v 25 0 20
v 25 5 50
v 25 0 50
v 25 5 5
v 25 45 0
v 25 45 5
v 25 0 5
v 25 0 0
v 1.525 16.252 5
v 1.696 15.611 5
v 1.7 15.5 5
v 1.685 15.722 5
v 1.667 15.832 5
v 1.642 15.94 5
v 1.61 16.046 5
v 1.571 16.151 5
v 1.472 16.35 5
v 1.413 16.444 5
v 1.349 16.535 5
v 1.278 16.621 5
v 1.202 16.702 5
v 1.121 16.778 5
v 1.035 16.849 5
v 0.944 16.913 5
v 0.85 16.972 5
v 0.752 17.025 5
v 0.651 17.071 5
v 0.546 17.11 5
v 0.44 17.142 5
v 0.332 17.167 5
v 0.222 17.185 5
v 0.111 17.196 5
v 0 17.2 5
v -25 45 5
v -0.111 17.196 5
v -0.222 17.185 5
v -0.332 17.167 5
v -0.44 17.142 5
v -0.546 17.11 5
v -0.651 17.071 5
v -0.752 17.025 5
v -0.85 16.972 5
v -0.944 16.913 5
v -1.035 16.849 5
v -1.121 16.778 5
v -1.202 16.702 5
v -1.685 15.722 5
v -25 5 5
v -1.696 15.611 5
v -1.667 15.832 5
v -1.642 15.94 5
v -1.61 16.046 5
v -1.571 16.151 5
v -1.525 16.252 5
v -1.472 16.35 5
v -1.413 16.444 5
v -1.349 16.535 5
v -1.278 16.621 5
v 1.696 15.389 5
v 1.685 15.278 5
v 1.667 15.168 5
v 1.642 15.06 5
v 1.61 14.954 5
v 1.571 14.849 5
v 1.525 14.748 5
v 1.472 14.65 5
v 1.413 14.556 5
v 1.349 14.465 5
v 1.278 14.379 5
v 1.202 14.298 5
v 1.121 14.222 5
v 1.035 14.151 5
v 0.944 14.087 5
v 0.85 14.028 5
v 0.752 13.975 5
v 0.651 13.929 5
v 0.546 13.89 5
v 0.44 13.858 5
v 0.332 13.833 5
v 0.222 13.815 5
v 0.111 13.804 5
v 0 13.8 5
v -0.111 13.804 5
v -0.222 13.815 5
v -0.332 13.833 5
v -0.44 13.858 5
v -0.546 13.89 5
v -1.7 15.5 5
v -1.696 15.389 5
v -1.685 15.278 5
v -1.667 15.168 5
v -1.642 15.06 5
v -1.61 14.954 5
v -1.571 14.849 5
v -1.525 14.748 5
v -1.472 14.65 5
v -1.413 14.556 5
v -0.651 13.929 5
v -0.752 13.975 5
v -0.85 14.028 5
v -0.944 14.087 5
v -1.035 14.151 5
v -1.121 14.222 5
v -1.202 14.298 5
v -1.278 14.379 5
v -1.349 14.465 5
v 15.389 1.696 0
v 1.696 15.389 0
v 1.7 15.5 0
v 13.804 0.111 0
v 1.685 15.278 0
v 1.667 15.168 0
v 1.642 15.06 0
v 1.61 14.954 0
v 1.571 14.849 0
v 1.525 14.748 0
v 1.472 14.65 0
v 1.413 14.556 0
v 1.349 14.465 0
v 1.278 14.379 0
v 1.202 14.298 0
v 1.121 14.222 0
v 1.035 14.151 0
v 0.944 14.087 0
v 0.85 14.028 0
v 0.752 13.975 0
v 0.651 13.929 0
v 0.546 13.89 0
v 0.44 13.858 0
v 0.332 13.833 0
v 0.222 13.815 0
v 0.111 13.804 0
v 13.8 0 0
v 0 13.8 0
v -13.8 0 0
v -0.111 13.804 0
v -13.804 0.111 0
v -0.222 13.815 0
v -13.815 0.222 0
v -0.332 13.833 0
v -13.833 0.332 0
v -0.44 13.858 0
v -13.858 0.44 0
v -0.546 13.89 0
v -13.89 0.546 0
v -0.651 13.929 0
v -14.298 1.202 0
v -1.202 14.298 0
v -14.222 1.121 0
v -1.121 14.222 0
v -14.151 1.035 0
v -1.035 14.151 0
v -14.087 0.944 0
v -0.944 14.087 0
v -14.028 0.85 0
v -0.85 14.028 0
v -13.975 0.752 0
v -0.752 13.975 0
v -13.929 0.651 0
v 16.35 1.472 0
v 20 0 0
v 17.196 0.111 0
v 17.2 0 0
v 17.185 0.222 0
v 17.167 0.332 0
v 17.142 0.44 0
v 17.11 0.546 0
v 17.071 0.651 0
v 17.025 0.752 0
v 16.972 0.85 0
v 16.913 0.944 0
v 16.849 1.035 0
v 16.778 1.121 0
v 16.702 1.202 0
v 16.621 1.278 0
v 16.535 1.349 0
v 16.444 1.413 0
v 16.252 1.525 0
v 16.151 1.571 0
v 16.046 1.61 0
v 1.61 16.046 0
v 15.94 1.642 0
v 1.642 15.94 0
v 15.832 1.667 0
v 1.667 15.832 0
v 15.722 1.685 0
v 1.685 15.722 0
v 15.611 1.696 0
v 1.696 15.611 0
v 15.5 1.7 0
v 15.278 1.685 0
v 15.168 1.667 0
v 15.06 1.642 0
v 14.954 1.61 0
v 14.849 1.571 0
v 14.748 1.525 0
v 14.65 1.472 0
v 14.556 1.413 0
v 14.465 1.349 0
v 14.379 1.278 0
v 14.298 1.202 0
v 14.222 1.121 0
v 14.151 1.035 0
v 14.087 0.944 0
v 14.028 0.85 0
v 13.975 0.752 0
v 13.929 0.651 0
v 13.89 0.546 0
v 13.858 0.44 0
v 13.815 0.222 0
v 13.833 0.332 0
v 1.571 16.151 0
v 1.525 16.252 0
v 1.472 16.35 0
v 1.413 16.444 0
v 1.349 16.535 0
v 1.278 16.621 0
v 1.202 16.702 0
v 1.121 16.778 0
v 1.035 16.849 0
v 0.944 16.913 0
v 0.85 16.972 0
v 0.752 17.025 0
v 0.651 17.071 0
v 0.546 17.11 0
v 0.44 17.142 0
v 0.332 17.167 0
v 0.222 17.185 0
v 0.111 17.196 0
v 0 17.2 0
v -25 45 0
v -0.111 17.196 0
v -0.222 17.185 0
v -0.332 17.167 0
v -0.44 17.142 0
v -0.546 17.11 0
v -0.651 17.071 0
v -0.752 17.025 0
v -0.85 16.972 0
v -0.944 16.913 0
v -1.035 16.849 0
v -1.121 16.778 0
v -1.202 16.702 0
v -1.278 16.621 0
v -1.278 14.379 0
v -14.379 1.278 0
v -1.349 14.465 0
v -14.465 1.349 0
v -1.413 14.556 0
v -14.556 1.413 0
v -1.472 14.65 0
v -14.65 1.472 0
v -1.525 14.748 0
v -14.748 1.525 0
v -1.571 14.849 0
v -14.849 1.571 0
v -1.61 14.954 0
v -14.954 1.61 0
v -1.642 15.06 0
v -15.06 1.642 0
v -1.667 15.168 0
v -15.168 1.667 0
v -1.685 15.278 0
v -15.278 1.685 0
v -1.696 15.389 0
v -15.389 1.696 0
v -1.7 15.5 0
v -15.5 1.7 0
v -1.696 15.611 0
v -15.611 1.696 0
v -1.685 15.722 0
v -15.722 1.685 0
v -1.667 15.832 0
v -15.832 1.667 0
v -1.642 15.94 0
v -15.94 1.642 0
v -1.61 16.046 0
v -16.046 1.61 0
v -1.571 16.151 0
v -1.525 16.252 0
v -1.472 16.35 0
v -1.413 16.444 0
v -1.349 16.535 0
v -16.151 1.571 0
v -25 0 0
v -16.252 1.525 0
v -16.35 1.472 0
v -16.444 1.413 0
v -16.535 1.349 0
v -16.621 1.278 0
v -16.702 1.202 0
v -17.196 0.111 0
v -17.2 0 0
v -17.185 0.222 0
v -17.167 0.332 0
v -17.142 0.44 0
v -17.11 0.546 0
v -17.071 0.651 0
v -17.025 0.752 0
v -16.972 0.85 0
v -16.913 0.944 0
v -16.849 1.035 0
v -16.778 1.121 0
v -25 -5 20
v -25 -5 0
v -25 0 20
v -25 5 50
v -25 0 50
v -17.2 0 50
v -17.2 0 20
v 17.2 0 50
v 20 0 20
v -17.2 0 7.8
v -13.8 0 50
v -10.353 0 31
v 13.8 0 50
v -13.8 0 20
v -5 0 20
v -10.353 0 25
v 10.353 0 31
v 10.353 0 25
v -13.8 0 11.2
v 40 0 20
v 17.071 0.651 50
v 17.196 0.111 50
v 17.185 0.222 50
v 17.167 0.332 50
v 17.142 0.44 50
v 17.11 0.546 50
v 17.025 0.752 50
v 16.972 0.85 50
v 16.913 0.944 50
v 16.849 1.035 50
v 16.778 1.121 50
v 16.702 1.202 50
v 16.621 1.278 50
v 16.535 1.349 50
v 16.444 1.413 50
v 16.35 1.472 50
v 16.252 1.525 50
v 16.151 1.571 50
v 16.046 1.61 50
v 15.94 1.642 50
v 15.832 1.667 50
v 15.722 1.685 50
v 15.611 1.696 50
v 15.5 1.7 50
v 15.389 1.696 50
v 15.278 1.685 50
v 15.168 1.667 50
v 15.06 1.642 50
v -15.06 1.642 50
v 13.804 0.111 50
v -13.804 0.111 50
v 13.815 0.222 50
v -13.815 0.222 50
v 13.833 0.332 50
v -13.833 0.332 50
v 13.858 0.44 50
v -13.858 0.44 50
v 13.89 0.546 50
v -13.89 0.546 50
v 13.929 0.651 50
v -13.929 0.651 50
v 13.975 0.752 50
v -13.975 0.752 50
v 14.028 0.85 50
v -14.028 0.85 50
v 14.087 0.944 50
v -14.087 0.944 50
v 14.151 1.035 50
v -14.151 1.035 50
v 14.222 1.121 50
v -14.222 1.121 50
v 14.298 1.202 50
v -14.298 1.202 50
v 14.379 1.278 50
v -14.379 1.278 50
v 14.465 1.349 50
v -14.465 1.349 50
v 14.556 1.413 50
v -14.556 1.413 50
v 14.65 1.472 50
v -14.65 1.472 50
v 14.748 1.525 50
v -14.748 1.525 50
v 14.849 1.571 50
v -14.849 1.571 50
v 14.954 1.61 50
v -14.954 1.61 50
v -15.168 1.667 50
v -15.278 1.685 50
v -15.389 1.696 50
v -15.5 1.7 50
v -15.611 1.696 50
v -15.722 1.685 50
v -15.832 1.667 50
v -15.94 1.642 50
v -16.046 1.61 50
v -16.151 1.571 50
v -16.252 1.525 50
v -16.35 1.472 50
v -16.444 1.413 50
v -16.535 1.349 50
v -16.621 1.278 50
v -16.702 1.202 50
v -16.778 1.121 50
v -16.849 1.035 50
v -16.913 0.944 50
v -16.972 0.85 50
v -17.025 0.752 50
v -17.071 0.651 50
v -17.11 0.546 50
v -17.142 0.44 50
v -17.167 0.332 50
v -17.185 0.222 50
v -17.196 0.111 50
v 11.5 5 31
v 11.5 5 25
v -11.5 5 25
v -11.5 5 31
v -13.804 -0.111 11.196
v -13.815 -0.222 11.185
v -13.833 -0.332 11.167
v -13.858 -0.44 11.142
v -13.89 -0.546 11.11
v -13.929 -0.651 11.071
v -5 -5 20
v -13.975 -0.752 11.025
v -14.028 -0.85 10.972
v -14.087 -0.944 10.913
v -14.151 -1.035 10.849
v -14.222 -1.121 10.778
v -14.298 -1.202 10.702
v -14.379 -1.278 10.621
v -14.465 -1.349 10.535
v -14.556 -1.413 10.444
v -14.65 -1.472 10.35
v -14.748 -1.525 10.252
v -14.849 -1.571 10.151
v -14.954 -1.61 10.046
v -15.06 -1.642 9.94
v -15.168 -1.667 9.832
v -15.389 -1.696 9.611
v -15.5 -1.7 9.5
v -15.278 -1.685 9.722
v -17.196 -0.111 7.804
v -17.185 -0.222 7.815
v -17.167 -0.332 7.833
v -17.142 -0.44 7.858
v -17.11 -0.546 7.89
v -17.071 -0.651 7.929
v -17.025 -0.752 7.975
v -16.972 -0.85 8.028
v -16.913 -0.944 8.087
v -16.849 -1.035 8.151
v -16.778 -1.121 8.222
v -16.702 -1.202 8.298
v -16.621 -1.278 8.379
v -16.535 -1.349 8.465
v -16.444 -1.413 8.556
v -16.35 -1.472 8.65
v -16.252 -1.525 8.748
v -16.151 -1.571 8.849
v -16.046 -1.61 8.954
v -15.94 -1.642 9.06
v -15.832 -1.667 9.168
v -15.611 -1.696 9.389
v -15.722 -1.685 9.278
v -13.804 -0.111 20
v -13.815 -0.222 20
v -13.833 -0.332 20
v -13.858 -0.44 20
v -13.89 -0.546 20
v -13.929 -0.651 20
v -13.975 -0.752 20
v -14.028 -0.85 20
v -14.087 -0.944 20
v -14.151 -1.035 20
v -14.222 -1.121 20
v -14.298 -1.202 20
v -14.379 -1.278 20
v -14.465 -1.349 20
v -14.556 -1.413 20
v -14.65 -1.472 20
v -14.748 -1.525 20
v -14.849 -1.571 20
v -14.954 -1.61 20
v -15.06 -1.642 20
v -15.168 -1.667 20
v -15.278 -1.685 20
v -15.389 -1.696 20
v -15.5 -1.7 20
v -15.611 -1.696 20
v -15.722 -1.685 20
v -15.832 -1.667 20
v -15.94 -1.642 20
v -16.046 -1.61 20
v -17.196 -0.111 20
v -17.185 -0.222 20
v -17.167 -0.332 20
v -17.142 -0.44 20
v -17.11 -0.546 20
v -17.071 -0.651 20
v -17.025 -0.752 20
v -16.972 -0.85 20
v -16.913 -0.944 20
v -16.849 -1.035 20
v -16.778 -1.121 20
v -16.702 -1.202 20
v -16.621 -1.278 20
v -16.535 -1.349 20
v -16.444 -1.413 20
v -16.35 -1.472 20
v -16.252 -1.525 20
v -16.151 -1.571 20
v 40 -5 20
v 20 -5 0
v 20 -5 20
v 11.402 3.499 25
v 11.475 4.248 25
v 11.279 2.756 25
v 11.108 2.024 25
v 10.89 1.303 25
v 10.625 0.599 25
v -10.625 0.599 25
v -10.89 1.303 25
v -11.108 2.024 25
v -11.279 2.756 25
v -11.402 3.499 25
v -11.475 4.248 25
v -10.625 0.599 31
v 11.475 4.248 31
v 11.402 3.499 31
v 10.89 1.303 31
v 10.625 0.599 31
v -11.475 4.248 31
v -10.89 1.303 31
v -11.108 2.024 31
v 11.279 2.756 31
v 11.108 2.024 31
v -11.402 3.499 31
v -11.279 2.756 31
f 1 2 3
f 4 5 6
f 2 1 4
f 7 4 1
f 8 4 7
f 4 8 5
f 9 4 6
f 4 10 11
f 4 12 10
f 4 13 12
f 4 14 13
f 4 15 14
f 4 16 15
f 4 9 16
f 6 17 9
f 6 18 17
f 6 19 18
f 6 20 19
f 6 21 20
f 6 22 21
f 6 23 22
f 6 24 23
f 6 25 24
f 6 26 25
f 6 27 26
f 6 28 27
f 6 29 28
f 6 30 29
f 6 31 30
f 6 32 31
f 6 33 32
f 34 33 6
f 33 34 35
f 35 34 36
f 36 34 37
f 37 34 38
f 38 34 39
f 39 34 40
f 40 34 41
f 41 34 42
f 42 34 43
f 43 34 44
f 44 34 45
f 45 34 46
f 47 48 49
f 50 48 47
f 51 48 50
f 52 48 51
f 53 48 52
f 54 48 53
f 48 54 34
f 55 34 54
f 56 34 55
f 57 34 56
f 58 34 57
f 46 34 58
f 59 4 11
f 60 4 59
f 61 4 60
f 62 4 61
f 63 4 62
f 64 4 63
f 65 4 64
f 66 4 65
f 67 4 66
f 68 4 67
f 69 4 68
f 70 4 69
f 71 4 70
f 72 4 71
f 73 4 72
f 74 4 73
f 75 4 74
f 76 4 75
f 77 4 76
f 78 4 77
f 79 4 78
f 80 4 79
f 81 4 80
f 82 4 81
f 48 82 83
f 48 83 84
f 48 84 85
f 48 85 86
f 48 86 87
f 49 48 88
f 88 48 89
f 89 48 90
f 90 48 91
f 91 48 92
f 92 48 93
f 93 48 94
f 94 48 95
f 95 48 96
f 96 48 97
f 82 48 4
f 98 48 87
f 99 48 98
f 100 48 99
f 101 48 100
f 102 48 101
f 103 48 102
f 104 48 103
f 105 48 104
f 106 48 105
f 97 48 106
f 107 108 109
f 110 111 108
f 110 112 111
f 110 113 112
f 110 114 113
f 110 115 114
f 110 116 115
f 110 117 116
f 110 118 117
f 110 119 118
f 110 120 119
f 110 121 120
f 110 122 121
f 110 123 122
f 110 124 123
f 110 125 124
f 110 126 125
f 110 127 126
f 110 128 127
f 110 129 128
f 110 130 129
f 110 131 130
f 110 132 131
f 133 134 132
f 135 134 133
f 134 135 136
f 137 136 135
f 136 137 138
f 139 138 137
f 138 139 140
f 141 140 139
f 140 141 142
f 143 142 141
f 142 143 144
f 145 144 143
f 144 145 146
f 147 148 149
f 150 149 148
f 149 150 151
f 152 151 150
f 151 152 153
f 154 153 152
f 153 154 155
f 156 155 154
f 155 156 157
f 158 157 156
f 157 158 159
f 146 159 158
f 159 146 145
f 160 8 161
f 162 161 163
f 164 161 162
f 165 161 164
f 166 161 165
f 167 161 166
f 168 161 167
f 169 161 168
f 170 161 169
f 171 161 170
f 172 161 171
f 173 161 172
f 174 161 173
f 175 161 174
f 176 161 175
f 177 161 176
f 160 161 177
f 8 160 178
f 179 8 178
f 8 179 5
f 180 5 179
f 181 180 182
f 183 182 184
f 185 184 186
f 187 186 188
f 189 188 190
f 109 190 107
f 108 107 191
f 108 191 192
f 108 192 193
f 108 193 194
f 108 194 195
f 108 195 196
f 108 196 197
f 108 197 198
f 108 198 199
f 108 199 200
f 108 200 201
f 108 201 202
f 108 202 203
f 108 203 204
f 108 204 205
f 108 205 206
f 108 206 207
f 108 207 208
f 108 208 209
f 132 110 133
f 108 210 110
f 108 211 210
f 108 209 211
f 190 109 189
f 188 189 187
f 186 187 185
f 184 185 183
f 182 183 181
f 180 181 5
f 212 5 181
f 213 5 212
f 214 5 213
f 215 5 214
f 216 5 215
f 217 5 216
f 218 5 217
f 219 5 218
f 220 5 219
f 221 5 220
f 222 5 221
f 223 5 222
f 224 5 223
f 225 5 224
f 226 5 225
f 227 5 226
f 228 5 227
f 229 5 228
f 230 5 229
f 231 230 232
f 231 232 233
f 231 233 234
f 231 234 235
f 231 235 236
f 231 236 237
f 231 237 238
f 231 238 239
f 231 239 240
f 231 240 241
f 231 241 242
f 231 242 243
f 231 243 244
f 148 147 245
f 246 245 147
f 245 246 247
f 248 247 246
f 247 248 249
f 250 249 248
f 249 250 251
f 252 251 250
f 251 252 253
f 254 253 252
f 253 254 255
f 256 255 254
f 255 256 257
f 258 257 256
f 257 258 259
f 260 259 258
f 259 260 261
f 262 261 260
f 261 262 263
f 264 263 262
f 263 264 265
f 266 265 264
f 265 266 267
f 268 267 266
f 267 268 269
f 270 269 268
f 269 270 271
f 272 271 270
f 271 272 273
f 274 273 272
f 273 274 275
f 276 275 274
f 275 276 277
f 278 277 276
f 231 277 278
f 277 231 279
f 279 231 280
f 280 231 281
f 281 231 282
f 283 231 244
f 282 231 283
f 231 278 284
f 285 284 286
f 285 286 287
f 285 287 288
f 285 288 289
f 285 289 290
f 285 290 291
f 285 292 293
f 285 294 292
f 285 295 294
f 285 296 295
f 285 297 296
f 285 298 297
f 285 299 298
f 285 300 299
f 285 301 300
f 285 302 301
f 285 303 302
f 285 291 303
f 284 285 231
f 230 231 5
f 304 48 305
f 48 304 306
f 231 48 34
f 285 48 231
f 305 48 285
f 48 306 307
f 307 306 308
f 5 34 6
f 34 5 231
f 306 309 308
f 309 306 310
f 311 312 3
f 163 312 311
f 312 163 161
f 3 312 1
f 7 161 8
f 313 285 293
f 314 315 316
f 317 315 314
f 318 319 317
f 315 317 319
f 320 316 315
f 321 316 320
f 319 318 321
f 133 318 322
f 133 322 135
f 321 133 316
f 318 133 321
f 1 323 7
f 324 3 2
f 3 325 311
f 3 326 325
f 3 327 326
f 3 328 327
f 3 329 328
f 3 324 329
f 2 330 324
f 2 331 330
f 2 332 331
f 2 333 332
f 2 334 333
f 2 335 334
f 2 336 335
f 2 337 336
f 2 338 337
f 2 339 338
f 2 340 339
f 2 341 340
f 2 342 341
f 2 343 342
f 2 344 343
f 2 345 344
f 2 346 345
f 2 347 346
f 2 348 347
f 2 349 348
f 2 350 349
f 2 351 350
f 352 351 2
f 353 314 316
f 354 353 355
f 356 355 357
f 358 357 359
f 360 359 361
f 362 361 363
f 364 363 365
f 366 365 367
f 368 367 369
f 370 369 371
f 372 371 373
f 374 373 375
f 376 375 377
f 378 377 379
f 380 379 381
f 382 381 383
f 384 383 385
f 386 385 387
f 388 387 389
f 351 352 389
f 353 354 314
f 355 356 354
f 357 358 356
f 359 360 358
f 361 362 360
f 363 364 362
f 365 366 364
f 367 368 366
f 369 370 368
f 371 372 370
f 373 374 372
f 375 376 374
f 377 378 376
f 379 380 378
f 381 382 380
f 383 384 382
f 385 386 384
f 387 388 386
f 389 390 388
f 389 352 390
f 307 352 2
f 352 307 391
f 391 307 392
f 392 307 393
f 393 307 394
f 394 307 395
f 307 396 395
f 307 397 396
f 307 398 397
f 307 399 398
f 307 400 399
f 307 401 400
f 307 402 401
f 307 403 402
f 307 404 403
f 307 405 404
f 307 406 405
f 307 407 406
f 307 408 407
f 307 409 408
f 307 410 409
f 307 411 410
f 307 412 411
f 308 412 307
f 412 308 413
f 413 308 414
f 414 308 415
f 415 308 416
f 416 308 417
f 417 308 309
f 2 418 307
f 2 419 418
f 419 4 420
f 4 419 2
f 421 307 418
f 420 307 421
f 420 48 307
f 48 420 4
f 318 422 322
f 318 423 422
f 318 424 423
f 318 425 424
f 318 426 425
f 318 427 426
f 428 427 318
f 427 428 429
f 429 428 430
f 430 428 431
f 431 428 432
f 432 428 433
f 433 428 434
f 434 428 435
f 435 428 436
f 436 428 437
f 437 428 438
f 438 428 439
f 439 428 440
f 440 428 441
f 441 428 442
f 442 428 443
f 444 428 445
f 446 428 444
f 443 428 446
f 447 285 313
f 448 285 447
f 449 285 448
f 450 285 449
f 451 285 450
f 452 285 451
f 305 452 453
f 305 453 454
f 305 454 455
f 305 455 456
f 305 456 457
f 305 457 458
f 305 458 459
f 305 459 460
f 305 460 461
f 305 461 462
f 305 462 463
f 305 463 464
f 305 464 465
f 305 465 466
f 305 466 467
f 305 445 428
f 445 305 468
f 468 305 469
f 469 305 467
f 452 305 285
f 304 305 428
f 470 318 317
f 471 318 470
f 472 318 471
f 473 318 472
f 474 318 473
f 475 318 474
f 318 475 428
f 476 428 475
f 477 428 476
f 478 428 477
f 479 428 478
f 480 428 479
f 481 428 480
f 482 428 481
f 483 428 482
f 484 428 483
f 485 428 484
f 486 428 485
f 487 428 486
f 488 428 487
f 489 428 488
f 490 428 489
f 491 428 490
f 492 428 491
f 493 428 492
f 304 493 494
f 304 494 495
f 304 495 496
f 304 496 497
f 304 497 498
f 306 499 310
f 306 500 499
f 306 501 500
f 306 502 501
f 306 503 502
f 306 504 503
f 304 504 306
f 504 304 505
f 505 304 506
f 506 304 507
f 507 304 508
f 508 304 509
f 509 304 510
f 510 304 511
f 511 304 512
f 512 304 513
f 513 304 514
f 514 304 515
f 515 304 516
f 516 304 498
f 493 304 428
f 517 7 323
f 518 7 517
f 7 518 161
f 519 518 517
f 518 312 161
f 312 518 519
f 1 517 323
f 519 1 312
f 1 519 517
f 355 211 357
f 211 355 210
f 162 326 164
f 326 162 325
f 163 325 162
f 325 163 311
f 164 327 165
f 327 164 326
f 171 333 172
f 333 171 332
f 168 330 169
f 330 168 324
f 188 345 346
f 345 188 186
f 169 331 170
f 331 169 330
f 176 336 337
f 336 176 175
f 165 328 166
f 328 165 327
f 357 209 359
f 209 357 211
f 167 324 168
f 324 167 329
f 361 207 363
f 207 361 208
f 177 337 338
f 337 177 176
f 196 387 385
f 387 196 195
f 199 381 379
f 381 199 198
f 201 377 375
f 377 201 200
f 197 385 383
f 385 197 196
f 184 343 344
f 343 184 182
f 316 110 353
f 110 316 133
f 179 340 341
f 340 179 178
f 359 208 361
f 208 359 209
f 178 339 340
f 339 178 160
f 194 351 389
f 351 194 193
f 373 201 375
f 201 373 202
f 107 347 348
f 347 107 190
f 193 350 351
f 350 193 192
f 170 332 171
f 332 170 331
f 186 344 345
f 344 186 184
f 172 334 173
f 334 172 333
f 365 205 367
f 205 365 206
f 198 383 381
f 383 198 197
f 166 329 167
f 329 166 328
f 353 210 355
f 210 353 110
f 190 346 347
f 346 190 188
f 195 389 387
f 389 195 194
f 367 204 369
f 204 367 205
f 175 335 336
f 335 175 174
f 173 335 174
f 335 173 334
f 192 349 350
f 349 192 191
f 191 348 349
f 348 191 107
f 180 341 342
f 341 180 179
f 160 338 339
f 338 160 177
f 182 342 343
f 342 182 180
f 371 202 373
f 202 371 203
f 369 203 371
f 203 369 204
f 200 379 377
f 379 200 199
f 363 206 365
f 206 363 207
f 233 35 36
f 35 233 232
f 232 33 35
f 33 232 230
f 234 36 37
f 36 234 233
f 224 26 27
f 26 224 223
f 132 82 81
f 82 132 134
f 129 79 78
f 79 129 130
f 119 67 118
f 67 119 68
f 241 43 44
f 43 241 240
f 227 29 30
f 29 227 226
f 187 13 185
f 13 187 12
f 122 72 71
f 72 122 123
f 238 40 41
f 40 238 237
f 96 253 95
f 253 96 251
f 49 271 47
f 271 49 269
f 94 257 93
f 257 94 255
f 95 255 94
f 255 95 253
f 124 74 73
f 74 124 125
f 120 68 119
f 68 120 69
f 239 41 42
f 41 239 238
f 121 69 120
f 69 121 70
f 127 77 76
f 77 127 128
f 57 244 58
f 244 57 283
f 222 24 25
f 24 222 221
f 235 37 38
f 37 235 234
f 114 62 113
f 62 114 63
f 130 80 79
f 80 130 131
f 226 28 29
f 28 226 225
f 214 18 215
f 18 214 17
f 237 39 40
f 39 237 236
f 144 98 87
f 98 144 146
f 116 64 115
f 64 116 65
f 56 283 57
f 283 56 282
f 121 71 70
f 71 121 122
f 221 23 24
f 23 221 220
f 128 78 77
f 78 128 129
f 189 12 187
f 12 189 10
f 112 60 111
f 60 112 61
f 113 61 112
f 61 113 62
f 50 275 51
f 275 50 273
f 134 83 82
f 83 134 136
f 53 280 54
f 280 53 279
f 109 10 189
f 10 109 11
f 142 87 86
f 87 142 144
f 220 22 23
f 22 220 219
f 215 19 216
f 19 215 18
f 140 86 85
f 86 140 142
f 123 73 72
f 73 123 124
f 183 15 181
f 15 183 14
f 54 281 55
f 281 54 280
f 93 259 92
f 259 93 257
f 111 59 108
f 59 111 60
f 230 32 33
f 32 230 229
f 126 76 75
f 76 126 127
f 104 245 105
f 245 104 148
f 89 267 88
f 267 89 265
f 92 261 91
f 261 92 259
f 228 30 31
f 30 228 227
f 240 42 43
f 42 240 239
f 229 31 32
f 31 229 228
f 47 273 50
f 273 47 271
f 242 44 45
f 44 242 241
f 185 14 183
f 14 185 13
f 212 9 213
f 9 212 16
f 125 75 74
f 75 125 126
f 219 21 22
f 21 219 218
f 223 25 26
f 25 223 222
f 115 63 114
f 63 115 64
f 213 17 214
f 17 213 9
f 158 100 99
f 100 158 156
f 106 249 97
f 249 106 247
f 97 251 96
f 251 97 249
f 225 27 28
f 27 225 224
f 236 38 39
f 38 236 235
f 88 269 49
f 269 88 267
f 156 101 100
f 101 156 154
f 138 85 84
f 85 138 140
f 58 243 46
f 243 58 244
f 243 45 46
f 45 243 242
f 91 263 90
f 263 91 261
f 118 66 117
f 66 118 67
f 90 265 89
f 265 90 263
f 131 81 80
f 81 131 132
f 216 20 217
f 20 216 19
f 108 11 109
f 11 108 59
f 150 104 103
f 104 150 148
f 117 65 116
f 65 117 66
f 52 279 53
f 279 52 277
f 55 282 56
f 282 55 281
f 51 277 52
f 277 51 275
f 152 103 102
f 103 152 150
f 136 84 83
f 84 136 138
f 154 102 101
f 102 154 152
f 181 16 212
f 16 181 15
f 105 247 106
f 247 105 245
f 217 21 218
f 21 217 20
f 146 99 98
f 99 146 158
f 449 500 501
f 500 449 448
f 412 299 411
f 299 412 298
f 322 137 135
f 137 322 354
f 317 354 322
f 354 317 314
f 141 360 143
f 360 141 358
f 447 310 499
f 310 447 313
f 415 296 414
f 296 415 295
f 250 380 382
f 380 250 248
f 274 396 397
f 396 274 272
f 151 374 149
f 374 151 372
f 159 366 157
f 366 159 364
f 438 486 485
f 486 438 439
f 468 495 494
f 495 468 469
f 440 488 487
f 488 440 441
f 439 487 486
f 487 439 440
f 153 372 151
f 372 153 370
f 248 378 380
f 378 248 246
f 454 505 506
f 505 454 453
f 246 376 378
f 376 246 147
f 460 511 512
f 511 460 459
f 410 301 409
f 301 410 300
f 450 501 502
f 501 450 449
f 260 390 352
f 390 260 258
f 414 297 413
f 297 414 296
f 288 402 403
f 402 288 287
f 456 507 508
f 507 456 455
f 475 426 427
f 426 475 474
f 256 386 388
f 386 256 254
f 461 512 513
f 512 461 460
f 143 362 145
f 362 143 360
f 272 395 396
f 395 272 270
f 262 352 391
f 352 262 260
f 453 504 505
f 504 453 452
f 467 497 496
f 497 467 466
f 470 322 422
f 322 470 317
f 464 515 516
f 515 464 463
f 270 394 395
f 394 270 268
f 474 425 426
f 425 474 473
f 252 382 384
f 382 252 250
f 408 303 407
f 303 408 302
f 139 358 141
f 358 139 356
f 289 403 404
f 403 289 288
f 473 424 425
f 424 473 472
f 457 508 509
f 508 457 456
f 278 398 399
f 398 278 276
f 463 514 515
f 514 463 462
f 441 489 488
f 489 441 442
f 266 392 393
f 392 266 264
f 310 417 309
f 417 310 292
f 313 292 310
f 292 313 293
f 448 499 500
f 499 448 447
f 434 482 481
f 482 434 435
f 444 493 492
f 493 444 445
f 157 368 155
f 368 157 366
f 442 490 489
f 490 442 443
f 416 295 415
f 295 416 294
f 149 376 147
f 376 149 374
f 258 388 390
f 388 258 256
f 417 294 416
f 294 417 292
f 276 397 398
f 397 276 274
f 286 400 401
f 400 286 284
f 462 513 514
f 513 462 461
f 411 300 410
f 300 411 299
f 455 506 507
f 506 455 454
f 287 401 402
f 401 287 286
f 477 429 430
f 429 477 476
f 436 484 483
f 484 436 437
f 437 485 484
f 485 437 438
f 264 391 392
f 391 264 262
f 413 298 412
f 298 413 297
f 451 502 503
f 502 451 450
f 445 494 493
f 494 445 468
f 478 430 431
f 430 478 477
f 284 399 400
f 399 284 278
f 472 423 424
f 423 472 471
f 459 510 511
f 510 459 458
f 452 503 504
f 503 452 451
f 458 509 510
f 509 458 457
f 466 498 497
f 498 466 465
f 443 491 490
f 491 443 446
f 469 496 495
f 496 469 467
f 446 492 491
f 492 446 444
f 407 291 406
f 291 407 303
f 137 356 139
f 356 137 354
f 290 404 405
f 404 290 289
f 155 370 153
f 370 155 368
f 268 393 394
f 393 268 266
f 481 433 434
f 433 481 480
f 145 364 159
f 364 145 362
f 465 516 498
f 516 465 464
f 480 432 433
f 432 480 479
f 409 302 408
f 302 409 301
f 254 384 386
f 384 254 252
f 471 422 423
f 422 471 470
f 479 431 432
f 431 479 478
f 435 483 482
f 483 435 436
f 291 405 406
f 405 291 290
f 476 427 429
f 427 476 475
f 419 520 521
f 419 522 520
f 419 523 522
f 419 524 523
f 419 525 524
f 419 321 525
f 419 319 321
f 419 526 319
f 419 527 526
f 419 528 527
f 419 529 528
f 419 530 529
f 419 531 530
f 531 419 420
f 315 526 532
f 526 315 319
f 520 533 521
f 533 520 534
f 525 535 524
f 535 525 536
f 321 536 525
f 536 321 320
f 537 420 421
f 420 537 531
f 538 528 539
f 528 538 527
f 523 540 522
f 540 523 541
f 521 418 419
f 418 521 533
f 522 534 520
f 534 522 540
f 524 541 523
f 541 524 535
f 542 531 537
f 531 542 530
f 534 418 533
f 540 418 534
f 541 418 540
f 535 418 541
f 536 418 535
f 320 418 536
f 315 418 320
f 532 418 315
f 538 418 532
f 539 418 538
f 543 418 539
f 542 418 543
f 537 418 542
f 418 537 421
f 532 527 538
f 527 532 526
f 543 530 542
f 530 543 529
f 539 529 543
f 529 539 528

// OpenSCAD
// L-shaped mounting bracket for NEMA 17 stepper motor
// Print orientation: base plate on bed (z = 0), motor plate builds upward (+Z)

// ---------- Dimensions (mm) ----------
base_x0      = -25;   // base plate x start
base_x1      = 25;    // base plate x end
base_y0      = 0;     // base plate y start
base_y1      = 45;    // base plate y end
base_z1      = 5;     // base plate thickness (z end)

motor_x0     = -25;   // motor plate x start
motor_x1     = 25;    // motor plate x end
motor_y0     = 0;     // motor plate y start
motor_y1     = 5;     // motor plate y end (thickness)
motor_z1     = 50;    // motor plate top (z end)

boss_d       = 23;    // motor centring boss hole diameter
boss_x       = 0;     // boss hole centre x
boss_z       = 28;    // boss hole centre z

screw_d      = 3.4;   // M3 screw holes diameter
screw_p      = 31;    // screw hole square pattern side length

gusset_t     = 5;     // gusset thickness (X)
gusset_y     = 20;    // gusset leg along +Y
gusset_z     = 20;    // gusset leg along +Z

eps          = 0.5;   // cutter overshoot past faces

$fn = 96;             // curve resolution

// ---------- Model ----------
difference() {
    union() {
        // Base plate
        translate([base_x0, base_y0, 0])
            cube([base_x1 - base_x0, base_y1 - base_y0, base_z1]);

        // Vertical motor plate
        translate([motor_x0, motor_y0, 0])
            cube([motor_x1 - motor_x0, motor_y1 - motor_y0, motor_z1]);

        // Left triangular gusset (x = -25 to -20)
        translate([-25, 0, 0])
            rotate([90, 0, 0])
                linear_extrude(height = gusset_t)
                    polygon(points = [
                        [0, gusset_y],
                        [gusset_z, gusset_y],
                        [0, 0]
                    ]);

        // Right triangular gusset (x = 20 to 25)
        translate([20, 0, 0])
            rotate([90, 0, 0])
                linear_extrude(height = gusset_t)
                    polygon(points = [
                        [0, gusset_y],
                        [gusset_z, gusset_y],
                        [0, 0]
                    ]);
    }

    // Boss hole for motor centring boss
    translate([boss_x, motor_y1, boss_z])
        cylinder(d = boss_d, h = motor_y1 + 2 * eps, center = true);

    // M3 screw holes on 31 mm square pattern, centred on boss hole
    for (a = [0, 90, 180, 270])
        rotate([0, 0, a])
            translate([screw_p / 2, 0, -eps])
                cylinder(d = screw_d, h = motor_z1 + 2 * eps);
}
